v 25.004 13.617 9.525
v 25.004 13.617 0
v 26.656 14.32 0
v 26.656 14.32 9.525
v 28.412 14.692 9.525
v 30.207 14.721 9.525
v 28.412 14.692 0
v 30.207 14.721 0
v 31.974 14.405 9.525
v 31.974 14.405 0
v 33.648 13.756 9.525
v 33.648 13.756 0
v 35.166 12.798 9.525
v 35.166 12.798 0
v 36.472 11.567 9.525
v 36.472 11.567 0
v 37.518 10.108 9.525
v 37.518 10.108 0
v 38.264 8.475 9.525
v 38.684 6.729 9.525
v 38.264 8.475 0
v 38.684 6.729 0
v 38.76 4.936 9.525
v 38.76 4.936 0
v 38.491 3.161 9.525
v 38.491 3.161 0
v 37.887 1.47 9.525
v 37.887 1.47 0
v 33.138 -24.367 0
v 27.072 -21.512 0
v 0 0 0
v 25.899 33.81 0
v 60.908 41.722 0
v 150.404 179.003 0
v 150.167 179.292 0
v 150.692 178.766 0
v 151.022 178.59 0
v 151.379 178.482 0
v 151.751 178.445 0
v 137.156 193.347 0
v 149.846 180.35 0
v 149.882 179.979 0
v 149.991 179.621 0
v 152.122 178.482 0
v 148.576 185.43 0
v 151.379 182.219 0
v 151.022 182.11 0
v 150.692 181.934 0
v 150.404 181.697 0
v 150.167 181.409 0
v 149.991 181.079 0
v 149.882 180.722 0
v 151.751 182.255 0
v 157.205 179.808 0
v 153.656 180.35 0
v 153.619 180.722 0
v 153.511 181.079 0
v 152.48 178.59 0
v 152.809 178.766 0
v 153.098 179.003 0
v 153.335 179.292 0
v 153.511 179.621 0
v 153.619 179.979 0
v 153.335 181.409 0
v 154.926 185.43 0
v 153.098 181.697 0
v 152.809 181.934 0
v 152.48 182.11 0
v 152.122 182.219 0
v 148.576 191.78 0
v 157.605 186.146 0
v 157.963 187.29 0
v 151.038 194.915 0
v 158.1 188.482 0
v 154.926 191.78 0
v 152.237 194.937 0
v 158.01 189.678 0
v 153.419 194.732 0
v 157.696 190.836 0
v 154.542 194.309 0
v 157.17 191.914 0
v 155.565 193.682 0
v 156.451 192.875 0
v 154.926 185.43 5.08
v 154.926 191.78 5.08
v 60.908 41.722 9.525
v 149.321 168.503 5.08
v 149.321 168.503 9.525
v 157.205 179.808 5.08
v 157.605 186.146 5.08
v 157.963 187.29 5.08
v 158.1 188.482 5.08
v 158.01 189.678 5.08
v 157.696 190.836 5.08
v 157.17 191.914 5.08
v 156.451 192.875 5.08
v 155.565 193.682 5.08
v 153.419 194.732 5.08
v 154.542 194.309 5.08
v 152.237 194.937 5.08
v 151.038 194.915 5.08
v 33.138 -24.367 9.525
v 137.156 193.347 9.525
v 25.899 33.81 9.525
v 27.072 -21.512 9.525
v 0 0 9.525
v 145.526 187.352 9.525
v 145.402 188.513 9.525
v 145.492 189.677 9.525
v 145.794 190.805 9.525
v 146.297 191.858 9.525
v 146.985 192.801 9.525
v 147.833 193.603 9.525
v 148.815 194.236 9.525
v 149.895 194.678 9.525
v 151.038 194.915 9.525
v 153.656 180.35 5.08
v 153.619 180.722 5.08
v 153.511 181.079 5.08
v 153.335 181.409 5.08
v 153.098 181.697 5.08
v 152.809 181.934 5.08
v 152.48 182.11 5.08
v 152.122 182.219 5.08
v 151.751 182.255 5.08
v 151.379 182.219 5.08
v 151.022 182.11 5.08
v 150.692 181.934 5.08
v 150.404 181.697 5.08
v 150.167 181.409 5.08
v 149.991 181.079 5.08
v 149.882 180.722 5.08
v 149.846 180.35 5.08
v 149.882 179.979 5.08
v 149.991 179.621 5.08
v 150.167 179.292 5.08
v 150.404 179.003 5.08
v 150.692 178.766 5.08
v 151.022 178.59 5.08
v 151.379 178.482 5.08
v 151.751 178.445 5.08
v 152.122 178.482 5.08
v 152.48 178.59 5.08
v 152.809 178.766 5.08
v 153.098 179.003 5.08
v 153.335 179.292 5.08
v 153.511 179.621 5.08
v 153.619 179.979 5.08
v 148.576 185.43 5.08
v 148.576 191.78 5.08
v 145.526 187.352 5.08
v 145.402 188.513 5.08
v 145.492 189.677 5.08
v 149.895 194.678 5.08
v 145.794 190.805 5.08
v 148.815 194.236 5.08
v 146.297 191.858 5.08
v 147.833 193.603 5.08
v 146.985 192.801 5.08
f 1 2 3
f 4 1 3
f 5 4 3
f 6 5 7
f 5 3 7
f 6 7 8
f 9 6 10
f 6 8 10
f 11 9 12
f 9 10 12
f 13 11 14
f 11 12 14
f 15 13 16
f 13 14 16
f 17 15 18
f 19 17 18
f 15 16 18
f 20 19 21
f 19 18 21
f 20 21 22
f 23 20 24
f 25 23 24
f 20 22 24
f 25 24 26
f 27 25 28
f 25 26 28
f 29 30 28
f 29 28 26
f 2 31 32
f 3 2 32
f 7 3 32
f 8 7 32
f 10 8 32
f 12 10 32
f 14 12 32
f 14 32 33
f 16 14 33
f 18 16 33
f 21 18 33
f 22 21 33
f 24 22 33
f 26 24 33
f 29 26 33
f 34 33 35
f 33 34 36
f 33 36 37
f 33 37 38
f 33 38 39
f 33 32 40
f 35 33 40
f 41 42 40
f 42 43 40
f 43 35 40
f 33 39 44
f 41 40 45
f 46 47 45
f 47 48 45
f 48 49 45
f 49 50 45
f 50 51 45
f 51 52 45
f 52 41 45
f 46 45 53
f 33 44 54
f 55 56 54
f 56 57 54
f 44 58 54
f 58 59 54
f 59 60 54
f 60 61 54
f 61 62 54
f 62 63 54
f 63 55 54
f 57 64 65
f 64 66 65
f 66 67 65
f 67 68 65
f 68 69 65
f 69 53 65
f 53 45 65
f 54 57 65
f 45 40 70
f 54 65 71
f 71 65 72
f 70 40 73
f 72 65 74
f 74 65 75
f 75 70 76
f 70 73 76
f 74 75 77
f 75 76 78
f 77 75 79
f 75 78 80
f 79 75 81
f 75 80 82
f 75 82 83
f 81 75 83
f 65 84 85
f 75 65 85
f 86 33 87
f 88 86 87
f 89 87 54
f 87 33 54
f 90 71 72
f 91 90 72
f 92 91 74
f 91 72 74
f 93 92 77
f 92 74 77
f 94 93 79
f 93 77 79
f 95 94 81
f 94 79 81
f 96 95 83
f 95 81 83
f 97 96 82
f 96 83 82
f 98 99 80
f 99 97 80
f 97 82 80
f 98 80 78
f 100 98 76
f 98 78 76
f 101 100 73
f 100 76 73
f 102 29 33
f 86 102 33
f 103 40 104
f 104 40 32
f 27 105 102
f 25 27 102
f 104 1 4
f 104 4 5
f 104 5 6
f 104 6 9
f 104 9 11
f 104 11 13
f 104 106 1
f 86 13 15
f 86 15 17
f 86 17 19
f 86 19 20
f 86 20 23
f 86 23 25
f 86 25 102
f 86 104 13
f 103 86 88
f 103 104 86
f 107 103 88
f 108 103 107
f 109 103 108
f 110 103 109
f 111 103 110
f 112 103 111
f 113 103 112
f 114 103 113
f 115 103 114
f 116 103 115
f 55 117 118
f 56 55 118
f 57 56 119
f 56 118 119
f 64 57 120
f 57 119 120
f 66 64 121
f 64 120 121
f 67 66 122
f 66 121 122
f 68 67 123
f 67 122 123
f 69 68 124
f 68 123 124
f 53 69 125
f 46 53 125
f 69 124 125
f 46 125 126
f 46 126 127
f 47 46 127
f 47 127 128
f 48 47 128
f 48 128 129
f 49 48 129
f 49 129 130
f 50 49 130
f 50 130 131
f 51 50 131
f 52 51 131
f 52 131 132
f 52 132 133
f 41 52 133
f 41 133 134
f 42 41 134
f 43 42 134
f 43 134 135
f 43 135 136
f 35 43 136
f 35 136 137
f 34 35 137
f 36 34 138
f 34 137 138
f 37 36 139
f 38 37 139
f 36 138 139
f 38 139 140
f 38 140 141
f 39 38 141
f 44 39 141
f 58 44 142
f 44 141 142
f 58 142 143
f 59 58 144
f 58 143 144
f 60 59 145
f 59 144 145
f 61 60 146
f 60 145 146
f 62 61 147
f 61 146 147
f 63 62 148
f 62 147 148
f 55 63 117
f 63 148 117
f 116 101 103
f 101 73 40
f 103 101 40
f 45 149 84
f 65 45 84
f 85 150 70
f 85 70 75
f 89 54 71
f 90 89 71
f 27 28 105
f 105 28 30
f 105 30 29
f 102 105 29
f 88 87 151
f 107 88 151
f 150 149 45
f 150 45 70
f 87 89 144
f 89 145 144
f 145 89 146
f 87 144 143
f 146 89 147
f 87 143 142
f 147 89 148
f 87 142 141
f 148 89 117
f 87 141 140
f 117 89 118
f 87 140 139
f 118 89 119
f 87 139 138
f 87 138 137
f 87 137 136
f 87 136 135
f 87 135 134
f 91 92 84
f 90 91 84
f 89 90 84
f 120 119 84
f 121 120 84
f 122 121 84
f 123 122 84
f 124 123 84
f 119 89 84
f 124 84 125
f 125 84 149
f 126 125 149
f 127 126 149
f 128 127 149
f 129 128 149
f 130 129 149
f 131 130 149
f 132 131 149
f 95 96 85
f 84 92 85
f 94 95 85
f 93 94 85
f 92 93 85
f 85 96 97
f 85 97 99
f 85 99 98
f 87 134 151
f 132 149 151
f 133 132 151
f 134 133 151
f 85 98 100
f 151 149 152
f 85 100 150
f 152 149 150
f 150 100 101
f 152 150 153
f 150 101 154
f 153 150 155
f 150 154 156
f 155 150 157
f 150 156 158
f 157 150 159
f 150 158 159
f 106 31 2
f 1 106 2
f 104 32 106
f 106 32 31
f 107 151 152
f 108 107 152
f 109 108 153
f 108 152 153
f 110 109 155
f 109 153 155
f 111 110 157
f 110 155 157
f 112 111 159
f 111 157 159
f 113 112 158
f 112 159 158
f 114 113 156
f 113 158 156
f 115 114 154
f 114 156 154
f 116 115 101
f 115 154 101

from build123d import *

# Parameters (mm, degrees)
BOSS_EXTRUDE1_DEPTH = 9.525
CUT_EXTRUDE1_START  = -4.445
CUT_EXTRUDE1_DEPTH  = 4.445
SKETCH3_R           = 1.905
SKETCH3_W           = 6.35
SKETCH3_H           = 6.35
CUT_EXTRUDE2_DEPTH  = 252.056346263


with BuildPart() as part:
    # Sketch1 → Boss-Extrude1 (new body)
    with BuildSketch(Plane.XY):
        with BuildLine():
            Line((37.887154169, 1.47019733), (27.071909447, -21.512197706))
            Line((27.071909447, -21.512197706), (33.138342598, -24.366989778))
            Line((33.138342598, -24.366989778), (60.90777145, 41.722489626))
            Line((60.90777145, 41.722489626), (157.204972785, 179.808197732))
            Line((157.204972785, 179.808197732), (157.605048009, 186.145582036))
            ThreePointArc((157.605048009, 186.145582036), (156.833701368, 192.411577396), (151.038083589, 194.915272276))
            Line((151.038083589, 194.915272276), (137.156365398, 193.347216127))
            Line((137.156365398, 193.347216127), (25.899136681, 33.809524518))
            Line((25.899136681, 33.809524518), (0, 0))
            Line((0, 0), (25.00366663, 13.61700957))
            ThreePointArc((25.00366663, 13.61700957), (35.848848557, 12.214099668), (37.887154169, 1.47019733))
        make_face()
    extrude(amount=BOSS_EXTRUDE1_DEPTH)

    # Sketch2 → Cut-Extrude1 (cut)
    with BuildSketch(Plane.XY.offset(9.525).offset(CUT_EXTRUDE1_START)):
        with BuildLine():
            Line((149.320840168, 168.502718236), (145.525755772, 187.35205629))
            ThreePointArc((145.525755772, 187.35205629), (146.619175628, 192.34552843), (151.038083589, 194.915272276))
            ThreePointArc((151.038083589, 194.915272276), (156.833701368, 192.411577396), (157.605048009, 186.145582036))
            Line((157.605048009, 186.145582036), (157.204972785, 179.808197732))
            Line((157.204972785, 179.808197732), (149.320840168, 168.502718236))
        make_face()
    extrude(amount=CUT_EXTRUDE1_DEPTH, mode=Mode.SUBTRACT)

    # Sketch3 → Cut-Extrude2 (cut, through all)
    with BuildSketch(Plane.XY.offset(5.08)):
        with Locations((151.750836383, 180.350400371)):
            Circle(SKETCH3_R)
        with Locations((151.750836383, 188.605400371)):
            Rectangle(SKETCH3_W, SKETCH3_H)
    extrude(amount=-CUT_EXTRUDE2_DEPTH, mode=Mode.SUBTRACT)


solid = part.part
